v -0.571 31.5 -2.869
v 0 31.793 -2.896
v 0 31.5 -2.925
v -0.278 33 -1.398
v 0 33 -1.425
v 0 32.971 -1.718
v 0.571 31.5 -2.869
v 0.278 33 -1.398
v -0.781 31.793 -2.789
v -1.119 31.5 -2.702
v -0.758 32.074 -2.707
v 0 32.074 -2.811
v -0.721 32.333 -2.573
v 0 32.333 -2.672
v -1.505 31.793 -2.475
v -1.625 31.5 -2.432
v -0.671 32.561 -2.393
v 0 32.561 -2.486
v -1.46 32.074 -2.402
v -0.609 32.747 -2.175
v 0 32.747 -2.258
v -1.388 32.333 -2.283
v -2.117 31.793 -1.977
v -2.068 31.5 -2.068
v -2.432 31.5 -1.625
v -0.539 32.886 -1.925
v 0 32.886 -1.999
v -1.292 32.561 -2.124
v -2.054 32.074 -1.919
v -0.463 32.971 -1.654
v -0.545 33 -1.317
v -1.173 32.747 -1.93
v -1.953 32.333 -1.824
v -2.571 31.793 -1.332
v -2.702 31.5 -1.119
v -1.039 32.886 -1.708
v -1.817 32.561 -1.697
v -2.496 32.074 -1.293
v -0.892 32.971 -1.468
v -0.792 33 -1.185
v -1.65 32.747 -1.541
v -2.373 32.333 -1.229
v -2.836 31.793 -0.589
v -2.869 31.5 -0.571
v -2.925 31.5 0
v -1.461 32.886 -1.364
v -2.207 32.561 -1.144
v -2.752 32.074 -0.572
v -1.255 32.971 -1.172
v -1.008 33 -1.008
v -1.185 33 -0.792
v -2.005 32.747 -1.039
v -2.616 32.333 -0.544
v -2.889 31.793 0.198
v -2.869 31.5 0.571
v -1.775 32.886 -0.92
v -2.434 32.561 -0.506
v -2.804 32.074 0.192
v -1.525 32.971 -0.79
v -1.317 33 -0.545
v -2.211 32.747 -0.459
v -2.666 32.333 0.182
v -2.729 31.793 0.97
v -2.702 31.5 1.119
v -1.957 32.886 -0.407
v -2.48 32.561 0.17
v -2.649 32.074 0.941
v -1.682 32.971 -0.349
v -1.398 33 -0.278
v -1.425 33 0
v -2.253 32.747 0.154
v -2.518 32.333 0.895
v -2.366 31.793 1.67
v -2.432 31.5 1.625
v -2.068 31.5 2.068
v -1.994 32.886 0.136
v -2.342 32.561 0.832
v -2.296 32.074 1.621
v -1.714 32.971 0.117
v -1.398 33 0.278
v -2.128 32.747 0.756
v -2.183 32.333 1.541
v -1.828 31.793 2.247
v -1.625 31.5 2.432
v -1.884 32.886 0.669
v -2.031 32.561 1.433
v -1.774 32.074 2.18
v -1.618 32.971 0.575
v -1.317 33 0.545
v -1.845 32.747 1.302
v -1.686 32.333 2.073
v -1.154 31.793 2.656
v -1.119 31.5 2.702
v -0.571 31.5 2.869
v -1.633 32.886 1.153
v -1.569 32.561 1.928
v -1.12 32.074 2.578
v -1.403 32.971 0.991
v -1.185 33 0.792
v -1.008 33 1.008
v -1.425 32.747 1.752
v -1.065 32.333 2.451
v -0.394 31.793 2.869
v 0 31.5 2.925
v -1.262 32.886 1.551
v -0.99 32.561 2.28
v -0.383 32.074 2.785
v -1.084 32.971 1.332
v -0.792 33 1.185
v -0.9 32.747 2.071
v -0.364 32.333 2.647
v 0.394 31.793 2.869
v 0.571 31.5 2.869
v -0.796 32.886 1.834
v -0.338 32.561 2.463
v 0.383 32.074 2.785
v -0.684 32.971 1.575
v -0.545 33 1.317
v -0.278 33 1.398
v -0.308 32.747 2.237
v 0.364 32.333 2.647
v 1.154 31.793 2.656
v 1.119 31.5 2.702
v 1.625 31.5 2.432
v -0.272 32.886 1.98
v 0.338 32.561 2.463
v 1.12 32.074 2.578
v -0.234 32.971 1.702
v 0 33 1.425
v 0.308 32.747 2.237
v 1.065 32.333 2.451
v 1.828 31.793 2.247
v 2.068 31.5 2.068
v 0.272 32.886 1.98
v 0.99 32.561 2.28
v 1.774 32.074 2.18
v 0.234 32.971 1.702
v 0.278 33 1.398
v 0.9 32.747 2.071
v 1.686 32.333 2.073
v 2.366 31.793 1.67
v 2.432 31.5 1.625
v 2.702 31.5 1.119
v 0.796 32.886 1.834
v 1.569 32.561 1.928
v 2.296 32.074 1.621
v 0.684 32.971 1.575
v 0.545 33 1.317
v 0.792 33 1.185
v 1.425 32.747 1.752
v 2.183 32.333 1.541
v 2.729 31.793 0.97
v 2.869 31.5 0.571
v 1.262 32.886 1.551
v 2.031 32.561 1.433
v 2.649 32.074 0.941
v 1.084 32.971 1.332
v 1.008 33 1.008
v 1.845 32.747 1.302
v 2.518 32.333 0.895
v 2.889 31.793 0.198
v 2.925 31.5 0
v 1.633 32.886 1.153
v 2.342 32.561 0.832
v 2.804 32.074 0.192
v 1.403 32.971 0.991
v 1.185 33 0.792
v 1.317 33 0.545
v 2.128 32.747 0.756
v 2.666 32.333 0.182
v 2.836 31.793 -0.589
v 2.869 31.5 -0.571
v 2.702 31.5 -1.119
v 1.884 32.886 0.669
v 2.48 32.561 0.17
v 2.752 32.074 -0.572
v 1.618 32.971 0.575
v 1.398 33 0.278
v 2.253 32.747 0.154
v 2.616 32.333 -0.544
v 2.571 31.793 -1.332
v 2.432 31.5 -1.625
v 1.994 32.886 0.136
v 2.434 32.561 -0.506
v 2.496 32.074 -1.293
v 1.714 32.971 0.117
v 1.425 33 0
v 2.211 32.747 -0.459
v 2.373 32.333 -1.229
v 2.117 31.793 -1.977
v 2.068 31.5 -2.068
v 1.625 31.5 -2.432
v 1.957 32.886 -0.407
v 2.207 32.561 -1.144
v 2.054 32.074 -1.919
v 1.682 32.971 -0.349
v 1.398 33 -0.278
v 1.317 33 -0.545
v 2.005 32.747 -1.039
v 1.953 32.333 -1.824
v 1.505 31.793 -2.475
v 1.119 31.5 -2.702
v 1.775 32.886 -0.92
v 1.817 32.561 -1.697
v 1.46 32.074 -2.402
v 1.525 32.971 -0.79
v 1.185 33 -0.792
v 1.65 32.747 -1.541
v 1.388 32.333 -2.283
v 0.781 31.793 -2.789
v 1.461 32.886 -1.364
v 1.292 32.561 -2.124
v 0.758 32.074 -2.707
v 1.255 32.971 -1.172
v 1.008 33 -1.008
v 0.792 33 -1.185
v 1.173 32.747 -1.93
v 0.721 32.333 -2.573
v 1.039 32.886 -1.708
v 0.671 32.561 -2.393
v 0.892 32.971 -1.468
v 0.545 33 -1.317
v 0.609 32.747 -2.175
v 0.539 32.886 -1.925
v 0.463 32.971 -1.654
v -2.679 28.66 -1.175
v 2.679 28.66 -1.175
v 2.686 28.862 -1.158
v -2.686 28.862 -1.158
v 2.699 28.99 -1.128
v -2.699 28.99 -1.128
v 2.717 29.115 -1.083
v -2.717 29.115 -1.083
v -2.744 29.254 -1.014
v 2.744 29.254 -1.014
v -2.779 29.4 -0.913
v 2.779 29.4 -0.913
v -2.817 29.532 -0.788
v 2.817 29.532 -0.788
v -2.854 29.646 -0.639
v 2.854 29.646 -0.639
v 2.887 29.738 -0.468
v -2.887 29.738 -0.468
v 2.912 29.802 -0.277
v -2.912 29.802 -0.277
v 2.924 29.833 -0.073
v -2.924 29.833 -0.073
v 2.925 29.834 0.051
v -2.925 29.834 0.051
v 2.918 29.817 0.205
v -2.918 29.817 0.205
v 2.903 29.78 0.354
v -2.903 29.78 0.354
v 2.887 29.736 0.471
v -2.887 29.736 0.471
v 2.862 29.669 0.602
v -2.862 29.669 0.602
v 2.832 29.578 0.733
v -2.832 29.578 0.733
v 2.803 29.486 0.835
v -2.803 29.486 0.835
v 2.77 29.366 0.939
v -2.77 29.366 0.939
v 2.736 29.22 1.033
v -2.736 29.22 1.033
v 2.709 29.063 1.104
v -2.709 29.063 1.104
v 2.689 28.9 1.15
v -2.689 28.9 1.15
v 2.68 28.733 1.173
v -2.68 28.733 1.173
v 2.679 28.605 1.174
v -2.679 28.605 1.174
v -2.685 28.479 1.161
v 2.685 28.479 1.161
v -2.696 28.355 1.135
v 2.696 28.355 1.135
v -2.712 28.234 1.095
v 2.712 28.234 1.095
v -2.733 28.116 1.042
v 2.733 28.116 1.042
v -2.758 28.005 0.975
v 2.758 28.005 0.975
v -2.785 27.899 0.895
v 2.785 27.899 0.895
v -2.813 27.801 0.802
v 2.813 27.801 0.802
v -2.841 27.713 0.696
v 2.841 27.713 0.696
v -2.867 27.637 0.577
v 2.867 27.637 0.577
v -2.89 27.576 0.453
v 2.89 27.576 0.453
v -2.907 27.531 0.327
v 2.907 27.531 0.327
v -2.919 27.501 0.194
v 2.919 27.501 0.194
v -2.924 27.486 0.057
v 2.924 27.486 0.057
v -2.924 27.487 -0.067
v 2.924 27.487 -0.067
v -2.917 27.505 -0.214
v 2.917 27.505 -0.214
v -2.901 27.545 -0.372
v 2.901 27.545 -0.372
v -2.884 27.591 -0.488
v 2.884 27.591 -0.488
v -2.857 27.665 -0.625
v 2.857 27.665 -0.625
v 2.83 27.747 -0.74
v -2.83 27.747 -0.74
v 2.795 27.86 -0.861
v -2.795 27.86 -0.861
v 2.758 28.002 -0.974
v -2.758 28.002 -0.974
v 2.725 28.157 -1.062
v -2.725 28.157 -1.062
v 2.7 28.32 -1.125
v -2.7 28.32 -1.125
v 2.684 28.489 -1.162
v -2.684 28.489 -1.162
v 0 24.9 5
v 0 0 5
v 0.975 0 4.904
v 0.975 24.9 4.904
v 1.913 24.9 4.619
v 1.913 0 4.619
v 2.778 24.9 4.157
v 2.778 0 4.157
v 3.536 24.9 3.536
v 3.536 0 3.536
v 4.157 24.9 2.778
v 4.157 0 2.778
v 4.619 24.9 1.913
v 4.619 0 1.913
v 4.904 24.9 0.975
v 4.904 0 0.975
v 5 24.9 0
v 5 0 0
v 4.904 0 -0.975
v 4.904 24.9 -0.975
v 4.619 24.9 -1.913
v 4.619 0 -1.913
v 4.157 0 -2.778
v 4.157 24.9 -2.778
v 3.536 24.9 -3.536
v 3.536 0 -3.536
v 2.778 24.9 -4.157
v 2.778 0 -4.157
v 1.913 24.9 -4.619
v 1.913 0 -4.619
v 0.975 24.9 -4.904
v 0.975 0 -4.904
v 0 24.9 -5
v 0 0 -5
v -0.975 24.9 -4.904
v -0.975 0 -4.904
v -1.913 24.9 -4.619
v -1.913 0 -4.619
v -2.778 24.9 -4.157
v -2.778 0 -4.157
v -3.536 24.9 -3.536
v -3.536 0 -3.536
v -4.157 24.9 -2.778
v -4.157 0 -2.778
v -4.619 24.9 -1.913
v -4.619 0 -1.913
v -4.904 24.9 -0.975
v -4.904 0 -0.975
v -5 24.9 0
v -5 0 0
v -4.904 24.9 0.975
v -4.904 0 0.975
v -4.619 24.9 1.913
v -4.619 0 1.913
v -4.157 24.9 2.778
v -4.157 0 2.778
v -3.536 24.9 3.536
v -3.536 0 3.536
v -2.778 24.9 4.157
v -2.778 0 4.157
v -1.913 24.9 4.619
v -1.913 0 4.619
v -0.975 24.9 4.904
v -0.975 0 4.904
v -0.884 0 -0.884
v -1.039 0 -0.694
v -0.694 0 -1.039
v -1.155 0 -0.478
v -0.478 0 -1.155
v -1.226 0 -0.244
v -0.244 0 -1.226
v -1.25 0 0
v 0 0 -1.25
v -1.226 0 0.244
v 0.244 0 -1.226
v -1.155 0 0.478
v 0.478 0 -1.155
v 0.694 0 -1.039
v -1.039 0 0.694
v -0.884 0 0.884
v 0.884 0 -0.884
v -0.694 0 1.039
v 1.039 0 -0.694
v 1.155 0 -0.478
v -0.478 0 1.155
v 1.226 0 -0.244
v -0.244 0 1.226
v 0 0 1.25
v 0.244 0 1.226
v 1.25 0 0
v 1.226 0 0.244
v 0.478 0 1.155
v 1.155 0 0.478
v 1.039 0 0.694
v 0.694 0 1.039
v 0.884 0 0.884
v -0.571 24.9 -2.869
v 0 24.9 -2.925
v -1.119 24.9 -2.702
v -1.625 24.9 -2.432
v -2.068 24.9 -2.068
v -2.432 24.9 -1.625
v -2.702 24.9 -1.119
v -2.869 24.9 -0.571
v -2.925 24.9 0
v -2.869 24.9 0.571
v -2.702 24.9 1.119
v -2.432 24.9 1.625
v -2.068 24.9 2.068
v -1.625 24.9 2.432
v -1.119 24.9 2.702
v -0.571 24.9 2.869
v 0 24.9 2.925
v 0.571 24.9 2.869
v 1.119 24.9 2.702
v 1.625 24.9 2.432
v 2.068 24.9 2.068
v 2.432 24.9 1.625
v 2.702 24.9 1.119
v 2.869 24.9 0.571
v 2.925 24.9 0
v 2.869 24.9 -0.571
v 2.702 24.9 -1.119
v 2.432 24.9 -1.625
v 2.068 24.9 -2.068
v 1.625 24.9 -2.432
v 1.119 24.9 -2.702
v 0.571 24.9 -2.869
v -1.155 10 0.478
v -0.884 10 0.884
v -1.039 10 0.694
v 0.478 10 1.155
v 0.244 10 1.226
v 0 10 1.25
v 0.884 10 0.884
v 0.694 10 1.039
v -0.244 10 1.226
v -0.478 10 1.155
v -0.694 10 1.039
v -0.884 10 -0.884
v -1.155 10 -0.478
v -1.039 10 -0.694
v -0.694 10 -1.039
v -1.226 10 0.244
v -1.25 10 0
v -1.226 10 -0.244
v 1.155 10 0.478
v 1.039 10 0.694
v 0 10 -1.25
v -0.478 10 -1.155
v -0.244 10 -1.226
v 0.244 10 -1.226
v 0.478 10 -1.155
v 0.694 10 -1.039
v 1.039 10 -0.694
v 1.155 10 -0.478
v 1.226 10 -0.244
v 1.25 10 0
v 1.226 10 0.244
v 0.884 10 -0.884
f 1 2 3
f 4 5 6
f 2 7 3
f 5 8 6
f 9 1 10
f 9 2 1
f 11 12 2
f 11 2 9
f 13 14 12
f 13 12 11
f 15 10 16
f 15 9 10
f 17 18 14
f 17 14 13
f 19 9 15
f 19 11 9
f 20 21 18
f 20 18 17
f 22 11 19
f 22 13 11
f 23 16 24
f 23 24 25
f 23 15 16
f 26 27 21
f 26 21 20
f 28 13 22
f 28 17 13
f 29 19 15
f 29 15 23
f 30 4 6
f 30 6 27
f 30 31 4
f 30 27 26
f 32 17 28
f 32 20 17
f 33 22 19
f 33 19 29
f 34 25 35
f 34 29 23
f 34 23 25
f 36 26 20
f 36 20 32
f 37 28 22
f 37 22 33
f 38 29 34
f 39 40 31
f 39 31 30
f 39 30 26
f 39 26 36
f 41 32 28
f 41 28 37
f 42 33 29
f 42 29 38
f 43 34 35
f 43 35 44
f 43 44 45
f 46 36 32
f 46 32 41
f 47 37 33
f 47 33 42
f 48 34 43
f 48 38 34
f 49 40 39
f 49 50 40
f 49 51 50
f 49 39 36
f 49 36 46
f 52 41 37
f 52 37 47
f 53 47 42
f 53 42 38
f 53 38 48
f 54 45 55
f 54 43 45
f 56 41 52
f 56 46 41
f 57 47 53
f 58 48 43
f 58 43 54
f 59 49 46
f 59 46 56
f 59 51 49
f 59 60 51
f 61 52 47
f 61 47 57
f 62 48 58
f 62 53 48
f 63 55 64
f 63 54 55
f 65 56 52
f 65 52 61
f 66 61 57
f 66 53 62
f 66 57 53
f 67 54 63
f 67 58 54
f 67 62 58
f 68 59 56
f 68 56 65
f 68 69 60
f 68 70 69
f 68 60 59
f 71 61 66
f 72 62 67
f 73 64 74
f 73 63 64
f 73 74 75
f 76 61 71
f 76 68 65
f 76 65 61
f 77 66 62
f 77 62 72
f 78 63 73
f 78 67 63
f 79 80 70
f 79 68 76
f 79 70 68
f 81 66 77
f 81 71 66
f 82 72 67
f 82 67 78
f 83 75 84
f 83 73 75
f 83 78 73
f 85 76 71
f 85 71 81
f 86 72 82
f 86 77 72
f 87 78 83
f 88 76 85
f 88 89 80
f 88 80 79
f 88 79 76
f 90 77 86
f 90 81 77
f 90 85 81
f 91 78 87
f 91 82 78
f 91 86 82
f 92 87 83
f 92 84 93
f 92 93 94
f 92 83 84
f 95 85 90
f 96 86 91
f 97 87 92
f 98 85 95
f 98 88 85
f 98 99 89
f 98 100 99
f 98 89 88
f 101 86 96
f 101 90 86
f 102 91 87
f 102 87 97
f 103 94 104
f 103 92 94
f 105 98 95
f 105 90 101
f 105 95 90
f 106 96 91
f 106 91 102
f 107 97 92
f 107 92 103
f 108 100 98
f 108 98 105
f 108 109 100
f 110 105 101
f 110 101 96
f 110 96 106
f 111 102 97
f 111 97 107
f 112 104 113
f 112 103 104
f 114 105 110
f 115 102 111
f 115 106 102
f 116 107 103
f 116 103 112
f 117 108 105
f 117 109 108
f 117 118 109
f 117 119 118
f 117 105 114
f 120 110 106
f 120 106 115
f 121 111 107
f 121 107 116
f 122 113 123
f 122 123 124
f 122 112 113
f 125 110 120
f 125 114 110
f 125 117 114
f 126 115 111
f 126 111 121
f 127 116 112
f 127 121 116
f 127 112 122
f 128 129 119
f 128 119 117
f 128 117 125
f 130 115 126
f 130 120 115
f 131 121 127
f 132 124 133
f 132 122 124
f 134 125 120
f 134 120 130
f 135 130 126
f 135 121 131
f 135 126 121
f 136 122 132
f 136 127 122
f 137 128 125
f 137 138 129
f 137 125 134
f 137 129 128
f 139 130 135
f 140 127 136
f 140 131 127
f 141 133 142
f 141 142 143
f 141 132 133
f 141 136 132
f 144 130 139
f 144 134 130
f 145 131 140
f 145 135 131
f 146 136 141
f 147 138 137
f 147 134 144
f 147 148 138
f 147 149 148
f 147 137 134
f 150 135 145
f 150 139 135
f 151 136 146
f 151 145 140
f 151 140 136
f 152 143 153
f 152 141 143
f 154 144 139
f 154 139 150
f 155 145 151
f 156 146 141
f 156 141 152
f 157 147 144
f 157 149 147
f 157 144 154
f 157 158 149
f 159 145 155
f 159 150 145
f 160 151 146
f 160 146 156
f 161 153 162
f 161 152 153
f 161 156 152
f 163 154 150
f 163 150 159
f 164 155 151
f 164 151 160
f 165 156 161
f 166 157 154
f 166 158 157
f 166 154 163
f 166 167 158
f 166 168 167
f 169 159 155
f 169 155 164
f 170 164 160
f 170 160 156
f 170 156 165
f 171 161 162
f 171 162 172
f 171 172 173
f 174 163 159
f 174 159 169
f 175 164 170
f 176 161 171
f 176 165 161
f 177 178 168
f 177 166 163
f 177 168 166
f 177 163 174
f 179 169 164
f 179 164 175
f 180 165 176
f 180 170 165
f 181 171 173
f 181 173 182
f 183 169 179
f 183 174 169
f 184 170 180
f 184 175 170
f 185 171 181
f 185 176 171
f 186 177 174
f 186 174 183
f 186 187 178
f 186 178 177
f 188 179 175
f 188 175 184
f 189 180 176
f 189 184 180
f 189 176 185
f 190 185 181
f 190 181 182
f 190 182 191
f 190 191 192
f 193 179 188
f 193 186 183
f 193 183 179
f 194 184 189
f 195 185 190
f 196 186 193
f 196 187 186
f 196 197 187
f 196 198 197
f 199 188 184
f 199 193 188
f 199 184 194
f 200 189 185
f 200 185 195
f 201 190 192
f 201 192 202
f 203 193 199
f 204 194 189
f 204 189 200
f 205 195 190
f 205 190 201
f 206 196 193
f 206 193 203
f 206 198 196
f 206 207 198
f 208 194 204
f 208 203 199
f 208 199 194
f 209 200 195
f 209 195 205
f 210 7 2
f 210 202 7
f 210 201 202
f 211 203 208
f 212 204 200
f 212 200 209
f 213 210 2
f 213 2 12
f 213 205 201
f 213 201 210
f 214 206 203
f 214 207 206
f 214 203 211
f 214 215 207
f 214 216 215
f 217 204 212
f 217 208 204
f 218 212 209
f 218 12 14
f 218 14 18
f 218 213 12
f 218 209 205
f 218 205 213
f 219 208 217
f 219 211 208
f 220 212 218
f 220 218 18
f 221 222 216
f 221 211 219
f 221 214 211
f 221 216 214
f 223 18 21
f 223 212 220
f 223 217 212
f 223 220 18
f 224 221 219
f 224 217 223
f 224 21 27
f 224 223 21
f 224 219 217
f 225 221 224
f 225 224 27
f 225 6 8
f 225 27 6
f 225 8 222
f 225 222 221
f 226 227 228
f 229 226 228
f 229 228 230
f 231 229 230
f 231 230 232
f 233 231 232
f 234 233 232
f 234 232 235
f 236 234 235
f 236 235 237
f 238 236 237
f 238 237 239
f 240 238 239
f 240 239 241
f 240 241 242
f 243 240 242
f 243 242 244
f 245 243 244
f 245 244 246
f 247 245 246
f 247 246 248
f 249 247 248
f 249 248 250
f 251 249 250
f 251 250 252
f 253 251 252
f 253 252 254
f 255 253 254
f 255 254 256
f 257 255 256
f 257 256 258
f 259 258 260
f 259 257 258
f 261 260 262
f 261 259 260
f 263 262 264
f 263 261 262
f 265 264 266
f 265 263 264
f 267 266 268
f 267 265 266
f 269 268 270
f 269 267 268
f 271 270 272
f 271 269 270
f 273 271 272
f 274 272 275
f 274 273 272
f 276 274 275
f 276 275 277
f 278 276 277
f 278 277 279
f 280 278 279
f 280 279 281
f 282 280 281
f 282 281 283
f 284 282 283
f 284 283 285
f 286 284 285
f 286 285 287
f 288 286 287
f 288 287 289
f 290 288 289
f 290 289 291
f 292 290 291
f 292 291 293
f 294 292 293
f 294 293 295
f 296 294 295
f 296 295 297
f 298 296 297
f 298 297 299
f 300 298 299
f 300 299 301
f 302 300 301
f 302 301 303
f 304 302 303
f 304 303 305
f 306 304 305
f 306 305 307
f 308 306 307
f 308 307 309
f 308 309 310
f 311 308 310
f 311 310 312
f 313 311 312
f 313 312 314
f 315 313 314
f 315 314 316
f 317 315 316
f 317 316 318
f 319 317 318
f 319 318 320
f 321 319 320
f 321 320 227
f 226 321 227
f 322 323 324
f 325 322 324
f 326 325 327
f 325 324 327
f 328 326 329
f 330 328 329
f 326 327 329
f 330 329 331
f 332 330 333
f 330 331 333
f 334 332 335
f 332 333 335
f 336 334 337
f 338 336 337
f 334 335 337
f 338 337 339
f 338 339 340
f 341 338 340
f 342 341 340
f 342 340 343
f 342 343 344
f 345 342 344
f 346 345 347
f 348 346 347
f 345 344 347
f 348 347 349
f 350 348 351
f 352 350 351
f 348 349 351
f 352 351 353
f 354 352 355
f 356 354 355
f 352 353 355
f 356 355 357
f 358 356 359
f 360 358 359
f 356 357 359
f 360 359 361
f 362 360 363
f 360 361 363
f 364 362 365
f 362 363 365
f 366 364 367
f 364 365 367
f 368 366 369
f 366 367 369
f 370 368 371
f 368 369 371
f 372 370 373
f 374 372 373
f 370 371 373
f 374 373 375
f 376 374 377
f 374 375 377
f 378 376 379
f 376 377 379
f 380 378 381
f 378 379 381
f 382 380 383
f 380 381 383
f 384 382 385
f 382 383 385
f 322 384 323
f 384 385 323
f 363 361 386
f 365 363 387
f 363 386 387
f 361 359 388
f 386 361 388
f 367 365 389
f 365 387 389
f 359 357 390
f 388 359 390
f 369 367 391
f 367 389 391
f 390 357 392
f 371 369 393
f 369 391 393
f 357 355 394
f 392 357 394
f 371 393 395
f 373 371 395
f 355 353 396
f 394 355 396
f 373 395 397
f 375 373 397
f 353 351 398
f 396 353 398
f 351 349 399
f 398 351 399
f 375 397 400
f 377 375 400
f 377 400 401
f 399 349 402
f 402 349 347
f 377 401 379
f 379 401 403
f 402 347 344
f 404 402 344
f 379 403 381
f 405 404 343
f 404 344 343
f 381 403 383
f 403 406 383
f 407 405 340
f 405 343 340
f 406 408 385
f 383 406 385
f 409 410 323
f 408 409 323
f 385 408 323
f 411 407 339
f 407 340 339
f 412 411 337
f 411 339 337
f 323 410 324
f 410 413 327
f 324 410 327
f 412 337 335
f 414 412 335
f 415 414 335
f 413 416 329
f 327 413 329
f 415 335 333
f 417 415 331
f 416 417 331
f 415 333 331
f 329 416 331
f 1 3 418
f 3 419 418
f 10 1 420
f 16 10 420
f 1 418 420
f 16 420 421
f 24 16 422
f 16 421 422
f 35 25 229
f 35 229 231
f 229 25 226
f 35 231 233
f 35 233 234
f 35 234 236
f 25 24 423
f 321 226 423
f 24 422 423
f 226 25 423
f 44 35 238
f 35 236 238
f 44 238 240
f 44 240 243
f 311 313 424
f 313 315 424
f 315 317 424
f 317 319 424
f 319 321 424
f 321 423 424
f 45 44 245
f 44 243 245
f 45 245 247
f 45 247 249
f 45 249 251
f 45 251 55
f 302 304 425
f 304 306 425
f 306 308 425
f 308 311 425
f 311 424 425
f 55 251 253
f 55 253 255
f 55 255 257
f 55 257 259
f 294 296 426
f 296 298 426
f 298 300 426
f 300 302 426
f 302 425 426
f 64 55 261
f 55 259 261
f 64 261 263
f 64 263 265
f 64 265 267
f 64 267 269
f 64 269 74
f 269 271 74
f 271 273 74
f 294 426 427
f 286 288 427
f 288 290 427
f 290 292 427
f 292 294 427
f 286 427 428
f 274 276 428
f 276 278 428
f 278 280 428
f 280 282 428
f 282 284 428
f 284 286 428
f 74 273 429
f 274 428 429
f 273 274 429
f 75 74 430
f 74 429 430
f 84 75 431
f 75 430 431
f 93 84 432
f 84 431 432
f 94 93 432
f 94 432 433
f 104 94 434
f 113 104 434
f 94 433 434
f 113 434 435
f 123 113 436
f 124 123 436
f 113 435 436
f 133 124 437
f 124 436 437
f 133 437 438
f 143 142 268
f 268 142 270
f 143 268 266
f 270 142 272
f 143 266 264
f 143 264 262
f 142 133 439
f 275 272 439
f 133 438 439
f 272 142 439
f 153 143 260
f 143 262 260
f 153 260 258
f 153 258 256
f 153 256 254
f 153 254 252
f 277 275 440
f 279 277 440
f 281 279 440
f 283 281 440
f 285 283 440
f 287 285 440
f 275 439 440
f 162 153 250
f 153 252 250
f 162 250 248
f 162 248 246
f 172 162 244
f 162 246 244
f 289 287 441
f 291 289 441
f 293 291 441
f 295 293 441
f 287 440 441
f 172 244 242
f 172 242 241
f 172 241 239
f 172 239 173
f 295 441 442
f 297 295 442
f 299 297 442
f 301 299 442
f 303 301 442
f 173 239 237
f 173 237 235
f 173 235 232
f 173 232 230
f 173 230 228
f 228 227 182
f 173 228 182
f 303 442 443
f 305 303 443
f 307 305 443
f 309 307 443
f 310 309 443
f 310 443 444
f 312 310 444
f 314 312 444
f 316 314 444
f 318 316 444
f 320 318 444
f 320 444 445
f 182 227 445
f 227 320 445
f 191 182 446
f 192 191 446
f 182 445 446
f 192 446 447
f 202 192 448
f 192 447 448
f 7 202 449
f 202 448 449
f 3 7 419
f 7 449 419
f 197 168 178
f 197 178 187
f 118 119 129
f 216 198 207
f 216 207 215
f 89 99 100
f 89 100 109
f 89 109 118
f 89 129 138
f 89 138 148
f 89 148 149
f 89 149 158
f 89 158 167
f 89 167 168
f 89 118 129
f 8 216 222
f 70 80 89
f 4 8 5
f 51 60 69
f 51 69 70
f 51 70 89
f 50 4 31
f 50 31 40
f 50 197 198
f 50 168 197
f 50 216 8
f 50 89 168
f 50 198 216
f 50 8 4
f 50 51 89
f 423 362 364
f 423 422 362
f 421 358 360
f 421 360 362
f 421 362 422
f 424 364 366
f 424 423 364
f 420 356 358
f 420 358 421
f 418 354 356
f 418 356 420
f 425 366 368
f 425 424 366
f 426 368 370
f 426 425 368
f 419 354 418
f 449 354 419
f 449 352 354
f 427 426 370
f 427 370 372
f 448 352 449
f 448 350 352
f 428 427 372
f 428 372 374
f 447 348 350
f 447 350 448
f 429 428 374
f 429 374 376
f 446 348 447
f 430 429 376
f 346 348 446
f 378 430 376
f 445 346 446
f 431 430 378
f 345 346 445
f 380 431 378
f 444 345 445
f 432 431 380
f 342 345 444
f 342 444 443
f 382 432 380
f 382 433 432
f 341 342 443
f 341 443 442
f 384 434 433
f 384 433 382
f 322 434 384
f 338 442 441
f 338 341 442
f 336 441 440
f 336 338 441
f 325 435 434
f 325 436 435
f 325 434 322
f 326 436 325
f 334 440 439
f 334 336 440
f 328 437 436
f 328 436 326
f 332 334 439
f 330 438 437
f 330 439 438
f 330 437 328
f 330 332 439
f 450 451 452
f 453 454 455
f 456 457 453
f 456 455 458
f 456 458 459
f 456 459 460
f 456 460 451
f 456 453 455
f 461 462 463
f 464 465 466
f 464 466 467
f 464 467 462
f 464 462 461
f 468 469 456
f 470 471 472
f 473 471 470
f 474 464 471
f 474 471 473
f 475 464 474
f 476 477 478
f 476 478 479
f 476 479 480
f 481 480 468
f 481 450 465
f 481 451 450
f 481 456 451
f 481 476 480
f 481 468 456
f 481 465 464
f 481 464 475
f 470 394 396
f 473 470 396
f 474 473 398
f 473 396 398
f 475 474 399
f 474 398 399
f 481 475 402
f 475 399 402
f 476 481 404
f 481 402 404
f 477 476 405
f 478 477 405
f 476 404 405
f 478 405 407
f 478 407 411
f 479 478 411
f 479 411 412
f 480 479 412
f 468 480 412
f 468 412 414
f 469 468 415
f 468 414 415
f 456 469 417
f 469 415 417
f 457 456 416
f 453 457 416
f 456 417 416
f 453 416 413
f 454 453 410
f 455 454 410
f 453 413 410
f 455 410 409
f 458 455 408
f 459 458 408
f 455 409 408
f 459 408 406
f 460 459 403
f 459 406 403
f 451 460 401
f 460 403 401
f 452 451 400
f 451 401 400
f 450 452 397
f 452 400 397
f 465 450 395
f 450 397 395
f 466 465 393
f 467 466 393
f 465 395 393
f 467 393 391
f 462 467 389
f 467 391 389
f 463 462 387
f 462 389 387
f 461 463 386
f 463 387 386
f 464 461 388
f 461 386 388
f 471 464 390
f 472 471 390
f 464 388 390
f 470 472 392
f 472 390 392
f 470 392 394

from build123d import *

# Parameters (mm, degrees)
SKETCH1_R               = 5
BOSS_EXTRUDE1_DEPTH     = 24.9
SKETCH2_R               = 2.925
BOSS_EXTRUDE2_DEPTH     = 8.1
FILLET1_R               = 1.5
CUT_EXTRUDE1_DEPTH      = 34.749074061
CUT_EXTRUDE1_DEPTH_BACK = 34.749074061
SKETCH3_R               = 1.175
SKETCH4_R               = 1.25
CUT_EXTRUDE2_DEPTH      = 10


with BuildPart() as part:
    # Sketch1 → Boss-Extrude1 (new body)
    with BuildSketch(Plane(origin=(0, 0, 0), x_dir=(1, 0, 0), z_dir=(0, 1, 0))):
        with Locations(Location((0, 0, 0), (0, 0, 270))):
            Circle(SKETCH1_R)
    extrude(amount=BOSS_EXTRUDE1_DEPTH)

    # Sketch2 → Boss-Extrude2 (add)
    with BuildSketch(Plane(origin=(0, 24.9, 0), x_dir=(1, 0, 0), z_dir=(0, 1, 0))):
        with Locations(Location((0, 0, 0), (0, 0, 90))):
            Circle(SKETCH2_R)
    extrude(amount=BOSS_EXTRUDE2_DEPTH)

    # Fillet1
    fillet1_edges = [part.edges().sort_by_distance(p)[0] for p in [
        (0, 33, 2.925),
    ]]
    fillet(fillet1_edges, radius=FILLET1_R)

    # Sketch3 → Cut-Extrude1 (cut, two sides: drawn at the far end of the back side and taken through both)
    with BuildSketch(Plane(origin=(0, 0, 0), x_dir=(0, 0, -1), z_dir=(1, 0, 0)).offset(-CUT_EXTRUDE1_DEPTH_BACK)):
        with Locations((0, 28.66)):
            Circle(SKETCH3_R)
    extrude(amount=CUT_EXTRUDE1_DEPTH + CUT_EXTRUDE1_DEPTH_BACK, mode=Mode.SUBTRACT)

    # Sketch4 → Cut-Extrude2 (cut)
    with BuildSketch(Plane.XZ):
        with Locations(Location((0, 0, 0), (0, 0, 270))):
            Circle(SKETCH4_R)
    extrude(amount=-CUT_EXTRUDE2_DEPTH, mode=Mode.SUBTRACT)


solid = part.part
